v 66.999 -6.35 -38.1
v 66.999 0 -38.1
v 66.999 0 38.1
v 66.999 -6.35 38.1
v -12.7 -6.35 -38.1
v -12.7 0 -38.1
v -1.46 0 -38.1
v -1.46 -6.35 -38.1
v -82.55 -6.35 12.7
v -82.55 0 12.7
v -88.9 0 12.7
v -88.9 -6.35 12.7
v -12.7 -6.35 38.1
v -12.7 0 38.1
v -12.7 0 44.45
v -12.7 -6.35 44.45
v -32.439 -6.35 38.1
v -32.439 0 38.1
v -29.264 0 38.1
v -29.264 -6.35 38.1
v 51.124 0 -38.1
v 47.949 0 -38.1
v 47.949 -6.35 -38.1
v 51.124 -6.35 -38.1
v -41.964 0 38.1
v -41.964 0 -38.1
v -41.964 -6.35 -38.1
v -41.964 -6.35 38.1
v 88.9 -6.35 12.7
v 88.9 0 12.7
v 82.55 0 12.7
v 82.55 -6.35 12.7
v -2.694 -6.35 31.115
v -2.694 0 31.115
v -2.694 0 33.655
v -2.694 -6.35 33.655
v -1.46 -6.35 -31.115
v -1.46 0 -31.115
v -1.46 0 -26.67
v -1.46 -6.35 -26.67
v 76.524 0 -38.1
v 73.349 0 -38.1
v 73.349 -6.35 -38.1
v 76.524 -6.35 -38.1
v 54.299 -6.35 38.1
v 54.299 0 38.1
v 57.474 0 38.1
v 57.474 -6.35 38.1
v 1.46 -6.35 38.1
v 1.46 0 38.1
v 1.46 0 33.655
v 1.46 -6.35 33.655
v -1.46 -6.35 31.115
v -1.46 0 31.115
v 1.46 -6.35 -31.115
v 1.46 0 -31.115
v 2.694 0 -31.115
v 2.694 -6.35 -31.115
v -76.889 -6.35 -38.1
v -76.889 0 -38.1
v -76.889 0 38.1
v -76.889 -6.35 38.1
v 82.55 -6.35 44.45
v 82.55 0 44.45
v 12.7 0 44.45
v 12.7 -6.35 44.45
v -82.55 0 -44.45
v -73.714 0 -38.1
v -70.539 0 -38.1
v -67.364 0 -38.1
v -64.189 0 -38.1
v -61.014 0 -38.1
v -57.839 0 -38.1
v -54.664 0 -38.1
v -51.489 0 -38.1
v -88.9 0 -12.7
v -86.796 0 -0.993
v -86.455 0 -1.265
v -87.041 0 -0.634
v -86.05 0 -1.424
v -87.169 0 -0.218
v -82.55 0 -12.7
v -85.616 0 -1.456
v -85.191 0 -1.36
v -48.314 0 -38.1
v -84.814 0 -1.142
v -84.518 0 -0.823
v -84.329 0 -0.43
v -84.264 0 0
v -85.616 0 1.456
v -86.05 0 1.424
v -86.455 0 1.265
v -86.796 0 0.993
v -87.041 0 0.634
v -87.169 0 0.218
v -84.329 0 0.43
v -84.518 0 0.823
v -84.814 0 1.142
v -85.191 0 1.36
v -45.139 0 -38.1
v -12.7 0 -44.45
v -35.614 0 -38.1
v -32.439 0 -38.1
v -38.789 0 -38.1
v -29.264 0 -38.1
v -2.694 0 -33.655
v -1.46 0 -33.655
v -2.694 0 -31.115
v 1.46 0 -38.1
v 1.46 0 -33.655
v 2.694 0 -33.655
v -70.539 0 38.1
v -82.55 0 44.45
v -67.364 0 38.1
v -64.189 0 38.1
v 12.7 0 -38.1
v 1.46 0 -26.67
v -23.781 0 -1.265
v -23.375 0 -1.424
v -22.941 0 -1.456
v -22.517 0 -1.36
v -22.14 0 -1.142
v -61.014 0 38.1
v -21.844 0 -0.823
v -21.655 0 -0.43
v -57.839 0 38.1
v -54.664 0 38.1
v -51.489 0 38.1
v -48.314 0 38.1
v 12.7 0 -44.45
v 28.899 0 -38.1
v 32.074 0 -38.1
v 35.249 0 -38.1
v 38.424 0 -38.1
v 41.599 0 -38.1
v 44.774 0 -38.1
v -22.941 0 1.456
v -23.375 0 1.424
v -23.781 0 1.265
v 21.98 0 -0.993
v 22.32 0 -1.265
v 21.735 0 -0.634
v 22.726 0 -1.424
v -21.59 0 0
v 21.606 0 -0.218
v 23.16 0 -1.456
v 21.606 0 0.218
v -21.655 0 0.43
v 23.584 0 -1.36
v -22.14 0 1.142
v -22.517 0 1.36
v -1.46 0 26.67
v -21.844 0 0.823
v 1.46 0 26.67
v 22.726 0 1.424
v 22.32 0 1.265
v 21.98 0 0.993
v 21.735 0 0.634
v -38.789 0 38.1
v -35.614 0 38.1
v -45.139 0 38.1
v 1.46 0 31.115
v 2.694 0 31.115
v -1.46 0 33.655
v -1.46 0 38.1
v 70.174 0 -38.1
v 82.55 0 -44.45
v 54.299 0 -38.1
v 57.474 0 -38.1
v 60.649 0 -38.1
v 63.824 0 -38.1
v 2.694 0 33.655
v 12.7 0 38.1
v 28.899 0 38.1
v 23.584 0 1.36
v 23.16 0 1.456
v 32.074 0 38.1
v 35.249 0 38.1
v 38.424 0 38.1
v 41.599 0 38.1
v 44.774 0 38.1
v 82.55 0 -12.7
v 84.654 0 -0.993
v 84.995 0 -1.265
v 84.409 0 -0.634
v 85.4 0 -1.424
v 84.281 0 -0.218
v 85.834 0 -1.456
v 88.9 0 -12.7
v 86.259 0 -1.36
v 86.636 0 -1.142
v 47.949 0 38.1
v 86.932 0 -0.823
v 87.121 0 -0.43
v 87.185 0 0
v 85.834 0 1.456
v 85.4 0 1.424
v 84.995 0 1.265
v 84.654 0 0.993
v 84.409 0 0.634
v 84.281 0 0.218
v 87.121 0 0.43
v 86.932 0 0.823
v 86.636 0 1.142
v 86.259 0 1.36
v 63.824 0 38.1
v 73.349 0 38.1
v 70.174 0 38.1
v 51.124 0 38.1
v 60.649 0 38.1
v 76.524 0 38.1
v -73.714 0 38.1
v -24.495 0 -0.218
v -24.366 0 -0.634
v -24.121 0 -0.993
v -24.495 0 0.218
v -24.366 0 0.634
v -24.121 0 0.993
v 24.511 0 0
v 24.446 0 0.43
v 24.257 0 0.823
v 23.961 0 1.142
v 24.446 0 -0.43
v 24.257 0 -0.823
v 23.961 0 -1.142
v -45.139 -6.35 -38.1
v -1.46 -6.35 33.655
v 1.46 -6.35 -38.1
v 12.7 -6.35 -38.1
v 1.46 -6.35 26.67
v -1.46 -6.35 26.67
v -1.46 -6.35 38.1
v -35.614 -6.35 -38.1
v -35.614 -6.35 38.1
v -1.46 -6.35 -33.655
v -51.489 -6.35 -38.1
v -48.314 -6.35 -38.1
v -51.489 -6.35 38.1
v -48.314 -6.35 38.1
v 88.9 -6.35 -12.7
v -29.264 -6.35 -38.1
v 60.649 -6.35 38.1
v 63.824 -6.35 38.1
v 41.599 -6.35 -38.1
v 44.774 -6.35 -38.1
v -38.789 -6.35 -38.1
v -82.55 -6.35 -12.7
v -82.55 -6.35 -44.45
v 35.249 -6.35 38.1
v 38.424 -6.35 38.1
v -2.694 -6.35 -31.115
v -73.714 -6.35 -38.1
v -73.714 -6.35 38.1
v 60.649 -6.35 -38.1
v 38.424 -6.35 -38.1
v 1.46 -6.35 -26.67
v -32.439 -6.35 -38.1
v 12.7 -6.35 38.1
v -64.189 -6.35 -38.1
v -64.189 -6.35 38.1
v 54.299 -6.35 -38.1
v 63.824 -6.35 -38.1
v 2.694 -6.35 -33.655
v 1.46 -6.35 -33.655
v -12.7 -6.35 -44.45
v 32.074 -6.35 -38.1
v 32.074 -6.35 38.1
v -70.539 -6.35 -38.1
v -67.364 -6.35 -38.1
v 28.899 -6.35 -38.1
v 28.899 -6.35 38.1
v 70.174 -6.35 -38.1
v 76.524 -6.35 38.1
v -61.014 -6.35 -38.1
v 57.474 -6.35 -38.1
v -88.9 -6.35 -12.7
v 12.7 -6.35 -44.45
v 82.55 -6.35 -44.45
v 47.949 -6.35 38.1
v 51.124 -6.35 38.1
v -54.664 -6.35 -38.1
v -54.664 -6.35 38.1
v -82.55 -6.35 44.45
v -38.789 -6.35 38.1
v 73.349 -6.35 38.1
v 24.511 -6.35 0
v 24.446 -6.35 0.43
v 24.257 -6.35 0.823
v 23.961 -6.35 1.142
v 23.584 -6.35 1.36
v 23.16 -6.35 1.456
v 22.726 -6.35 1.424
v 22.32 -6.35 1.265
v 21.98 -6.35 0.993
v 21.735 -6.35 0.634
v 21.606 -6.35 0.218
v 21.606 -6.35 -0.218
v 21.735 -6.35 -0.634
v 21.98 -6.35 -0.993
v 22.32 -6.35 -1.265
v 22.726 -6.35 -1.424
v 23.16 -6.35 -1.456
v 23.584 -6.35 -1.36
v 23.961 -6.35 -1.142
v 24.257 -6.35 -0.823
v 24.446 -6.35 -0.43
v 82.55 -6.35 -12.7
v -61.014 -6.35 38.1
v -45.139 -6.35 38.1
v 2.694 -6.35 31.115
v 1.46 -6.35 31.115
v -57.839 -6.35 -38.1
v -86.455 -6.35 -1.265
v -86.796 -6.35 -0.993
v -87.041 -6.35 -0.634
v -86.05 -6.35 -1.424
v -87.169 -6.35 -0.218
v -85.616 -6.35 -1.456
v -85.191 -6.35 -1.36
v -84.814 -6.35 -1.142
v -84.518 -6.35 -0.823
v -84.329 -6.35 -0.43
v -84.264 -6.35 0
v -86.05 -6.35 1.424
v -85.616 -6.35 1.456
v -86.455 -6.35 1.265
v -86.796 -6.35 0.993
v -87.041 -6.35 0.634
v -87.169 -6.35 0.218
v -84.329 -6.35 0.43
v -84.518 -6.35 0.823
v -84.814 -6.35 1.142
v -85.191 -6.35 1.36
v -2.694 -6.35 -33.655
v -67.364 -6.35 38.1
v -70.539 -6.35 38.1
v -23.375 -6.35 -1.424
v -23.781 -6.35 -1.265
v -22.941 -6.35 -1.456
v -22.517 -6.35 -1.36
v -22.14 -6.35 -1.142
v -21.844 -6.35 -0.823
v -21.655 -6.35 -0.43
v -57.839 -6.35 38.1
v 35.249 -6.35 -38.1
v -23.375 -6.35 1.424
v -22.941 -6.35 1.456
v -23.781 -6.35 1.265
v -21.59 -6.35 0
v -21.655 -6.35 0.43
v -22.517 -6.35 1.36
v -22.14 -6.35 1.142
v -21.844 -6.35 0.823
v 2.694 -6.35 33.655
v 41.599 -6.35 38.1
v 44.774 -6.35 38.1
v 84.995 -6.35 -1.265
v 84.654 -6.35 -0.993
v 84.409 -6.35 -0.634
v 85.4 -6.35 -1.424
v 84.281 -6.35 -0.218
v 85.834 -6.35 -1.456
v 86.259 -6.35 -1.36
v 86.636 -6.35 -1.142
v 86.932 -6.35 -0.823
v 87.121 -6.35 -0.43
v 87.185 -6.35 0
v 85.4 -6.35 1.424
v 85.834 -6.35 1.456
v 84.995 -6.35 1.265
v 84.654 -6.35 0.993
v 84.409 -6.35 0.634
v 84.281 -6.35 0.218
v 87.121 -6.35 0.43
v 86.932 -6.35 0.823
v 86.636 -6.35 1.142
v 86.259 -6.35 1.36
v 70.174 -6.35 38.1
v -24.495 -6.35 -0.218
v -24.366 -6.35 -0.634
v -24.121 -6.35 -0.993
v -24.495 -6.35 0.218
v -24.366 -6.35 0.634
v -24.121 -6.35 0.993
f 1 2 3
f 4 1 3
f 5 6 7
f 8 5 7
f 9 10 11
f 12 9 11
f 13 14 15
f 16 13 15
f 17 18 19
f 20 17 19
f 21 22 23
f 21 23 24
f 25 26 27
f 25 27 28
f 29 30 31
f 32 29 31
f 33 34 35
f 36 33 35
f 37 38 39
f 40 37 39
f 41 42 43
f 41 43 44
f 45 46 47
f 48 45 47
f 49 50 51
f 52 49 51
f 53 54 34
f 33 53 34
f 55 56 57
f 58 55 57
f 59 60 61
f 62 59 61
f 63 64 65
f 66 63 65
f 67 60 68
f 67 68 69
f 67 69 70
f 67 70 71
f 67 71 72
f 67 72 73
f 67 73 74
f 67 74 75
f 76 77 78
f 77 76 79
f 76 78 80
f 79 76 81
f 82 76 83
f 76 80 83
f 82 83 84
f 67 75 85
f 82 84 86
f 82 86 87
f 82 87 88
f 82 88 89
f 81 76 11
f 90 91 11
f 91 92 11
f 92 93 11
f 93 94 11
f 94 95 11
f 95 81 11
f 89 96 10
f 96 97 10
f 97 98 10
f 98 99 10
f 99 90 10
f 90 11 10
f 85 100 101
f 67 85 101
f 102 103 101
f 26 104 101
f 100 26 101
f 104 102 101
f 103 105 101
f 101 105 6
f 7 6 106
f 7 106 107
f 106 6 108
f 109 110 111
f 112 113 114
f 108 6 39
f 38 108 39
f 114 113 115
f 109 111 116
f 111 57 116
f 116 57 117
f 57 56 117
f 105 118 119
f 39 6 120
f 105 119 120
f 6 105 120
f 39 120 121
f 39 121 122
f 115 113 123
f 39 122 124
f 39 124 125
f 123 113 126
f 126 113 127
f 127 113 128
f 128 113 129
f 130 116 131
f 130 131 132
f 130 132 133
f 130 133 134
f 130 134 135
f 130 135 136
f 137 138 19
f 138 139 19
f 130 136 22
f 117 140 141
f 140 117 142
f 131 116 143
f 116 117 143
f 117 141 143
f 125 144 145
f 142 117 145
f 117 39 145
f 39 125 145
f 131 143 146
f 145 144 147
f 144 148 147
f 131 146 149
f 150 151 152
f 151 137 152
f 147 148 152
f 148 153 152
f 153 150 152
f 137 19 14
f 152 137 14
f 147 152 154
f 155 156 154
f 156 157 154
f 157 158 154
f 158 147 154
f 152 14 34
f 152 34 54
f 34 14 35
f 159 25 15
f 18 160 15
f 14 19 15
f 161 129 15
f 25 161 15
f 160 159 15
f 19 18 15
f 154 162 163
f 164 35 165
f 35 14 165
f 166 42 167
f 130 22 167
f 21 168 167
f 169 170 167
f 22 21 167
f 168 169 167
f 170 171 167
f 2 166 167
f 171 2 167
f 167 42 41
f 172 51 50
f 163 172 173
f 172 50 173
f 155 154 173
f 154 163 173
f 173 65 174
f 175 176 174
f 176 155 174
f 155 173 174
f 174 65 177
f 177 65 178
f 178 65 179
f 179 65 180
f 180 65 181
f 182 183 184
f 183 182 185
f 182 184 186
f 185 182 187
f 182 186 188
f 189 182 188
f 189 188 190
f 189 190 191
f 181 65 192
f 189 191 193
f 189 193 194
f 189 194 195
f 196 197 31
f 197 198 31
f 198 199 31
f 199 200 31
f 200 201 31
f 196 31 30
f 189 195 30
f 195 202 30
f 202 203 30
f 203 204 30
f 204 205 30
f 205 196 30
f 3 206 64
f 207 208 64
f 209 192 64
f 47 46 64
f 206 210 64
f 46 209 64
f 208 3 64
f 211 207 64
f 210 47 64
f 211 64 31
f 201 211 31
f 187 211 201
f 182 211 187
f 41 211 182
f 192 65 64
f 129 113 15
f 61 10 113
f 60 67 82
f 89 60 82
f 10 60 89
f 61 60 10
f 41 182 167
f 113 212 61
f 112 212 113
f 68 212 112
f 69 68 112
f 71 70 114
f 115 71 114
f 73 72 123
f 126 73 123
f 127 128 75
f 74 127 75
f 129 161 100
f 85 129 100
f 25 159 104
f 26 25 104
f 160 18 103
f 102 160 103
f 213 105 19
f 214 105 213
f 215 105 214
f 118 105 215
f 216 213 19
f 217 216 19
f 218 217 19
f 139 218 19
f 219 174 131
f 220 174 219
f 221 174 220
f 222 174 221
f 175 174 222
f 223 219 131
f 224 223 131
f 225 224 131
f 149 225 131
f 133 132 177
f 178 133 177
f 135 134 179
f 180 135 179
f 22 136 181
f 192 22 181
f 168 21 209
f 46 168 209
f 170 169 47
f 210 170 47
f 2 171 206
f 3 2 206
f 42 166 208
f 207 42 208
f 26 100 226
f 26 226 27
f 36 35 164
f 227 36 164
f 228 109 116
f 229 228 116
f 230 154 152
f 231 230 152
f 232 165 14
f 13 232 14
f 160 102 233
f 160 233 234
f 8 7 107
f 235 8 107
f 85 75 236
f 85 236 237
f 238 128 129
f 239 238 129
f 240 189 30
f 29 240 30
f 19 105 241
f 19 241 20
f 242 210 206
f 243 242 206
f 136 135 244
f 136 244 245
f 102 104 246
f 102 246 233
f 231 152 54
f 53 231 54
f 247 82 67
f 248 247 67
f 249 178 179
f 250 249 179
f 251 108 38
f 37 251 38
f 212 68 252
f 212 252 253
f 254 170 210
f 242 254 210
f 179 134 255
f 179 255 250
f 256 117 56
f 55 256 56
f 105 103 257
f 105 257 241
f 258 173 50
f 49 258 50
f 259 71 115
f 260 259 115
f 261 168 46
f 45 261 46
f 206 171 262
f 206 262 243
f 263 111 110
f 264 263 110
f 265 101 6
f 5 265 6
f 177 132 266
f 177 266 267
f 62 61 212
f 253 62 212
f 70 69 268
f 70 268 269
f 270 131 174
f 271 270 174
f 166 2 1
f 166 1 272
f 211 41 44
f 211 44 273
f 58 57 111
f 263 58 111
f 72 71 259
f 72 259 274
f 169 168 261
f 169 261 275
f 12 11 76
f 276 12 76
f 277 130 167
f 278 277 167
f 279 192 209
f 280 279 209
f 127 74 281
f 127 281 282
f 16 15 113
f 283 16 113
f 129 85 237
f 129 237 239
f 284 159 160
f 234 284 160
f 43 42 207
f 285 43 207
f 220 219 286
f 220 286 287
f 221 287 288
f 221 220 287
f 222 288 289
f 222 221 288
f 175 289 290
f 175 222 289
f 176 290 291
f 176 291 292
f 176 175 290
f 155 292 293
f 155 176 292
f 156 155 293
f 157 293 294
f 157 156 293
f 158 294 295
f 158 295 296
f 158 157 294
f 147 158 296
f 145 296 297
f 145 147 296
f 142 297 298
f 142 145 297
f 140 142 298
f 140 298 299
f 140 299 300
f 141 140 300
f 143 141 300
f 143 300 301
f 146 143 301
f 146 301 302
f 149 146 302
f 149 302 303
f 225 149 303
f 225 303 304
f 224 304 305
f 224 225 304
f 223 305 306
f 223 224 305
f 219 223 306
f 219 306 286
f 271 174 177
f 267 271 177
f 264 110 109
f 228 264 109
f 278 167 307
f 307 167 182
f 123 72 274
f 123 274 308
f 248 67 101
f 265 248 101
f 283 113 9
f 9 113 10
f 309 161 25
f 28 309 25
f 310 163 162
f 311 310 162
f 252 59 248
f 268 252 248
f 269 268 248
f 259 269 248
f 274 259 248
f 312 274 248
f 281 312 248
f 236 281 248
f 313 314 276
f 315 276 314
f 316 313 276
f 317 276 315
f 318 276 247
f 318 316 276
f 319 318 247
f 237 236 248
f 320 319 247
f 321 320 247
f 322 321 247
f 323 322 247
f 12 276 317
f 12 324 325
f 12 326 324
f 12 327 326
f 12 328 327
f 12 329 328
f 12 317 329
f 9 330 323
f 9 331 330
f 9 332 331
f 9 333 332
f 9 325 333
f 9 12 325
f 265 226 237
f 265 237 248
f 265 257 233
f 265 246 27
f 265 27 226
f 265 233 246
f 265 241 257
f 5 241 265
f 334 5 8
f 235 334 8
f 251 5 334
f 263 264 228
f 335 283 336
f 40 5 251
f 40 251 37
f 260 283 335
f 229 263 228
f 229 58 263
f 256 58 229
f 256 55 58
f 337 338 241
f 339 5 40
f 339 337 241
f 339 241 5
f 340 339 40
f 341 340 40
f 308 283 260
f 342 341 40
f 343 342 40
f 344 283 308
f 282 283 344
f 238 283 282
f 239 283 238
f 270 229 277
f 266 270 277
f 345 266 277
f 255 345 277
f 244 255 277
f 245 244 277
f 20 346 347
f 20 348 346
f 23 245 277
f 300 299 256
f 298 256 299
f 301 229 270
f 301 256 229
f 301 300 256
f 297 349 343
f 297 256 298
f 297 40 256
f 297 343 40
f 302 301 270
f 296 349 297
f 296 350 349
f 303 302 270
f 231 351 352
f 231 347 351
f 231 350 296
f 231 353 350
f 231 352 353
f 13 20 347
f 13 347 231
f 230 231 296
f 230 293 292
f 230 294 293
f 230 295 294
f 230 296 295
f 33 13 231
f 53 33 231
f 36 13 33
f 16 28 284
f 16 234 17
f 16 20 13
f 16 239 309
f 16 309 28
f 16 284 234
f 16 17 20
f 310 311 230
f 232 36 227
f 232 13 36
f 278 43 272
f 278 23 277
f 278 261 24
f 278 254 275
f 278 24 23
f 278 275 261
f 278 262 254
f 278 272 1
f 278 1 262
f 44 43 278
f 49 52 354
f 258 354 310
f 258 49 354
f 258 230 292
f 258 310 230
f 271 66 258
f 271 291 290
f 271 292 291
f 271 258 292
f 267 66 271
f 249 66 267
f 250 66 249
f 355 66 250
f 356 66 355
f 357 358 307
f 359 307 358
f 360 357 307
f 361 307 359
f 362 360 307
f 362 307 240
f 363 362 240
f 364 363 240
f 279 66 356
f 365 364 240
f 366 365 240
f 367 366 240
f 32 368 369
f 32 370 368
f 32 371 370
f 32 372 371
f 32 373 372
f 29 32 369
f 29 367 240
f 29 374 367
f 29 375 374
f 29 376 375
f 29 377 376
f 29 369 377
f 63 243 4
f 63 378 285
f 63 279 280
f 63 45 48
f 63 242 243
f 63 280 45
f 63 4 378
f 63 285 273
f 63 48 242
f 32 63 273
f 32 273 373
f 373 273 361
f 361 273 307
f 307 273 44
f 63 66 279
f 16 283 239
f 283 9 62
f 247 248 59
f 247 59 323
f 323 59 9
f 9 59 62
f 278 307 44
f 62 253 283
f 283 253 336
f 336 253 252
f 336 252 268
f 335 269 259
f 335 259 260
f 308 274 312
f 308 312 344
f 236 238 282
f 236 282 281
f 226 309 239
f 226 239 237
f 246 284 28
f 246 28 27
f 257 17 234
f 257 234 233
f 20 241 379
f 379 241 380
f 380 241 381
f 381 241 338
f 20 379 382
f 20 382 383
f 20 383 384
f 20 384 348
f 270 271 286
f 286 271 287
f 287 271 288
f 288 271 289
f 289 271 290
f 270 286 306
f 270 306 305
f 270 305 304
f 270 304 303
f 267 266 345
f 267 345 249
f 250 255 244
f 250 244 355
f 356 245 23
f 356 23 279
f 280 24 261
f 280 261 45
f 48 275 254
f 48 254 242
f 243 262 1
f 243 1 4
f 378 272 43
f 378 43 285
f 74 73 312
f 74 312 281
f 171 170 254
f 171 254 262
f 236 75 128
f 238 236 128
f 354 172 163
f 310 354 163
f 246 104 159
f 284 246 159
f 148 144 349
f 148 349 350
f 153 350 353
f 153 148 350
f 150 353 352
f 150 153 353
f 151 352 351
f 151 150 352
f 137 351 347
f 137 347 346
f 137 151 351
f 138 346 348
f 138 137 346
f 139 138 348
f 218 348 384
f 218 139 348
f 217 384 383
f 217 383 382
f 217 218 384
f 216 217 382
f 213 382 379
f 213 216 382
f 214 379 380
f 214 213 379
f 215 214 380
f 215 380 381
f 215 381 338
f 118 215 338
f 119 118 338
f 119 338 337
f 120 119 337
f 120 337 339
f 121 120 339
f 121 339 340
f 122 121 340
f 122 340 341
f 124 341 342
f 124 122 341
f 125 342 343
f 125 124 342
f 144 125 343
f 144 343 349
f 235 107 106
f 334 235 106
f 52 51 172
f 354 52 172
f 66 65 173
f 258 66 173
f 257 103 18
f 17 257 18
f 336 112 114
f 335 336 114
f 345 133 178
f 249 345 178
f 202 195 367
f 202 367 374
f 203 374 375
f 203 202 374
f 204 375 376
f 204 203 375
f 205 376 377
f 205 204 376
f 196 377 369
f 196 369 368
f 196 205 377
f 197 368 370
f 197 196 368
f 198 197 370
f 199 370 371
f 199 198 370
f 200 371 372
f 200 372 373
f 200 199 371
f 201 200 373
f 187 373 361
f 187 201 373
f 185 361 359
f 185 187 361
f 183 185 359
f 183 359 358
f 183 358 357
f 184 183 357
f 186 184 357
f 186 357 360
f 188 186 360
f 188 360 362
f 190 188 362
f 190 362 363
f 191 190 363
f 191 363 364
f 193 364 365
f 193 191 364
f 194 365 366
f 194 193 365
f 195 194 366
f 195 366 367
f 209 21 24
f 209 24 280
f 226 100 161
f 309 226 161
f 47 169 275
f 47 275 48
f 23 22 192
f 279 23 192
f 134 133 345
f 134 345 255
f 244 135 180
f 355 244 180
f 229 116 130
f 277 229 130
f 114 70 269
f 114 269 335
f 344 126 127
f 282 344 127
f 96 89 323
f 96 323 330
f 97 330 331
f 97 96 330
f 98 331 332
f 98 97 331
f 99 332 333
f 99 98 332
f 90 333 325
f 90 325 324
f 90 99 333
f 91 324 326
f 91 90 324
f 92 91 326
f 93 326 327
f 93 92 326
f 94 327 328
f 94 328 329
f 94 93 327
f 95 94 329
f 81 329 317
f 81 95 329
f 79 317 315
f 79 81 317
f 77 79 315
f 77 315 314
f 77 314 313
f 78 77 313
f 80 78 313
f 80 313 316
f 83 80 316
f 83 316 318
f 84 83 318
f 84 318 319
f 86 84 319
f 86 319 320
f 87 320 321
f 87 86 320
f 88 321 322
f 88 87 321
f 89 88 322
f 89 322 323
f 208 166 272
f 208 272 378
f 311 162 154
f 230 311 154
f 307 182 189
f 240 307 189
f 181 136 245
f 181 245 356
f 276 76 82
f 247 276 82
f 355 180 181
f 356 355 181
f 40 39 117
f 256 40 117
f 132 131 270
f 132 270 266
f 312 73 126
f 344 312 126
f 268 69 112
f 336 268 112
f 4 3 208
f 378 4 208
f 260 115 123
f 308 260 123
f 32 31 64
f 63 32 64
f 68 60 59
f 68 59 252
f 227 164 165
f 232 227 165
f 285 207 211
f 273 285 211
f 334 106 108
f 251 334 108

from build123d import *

# Parameters (mm, degrees)
F0_W     = 3.175
F0_H     = 76.2
F0_R     = 1.4605
F1_DEPTH = 6.35


with BuildPart() as f1:
    # F0 (on Front) → F1 (new body)
    with BuildSketch(Plane.XZ):
        Polygon((82.55, 12.7), (82.55, 44.45), (12.7, 44.45), (12.7, 38.1), (1.4605, 38.1), (1.4605, 33.655), (2.69367, 33.655), (2.69367, 31.115), (1.4605, 31.115), (1.4605, 26.67), (-1.4605, 26.67), (-1.4605, 31.115), (-2.69367, 31.115), (-2.69367, 33.655), (-1.4605, 33.655), (-1.4605, 38.1), (-12.7, 38.1), (-12.7, 44.45), (-82.55, 44.45), (-82.55, 12.7), (-88.9, 12.7), (-88.9, -12.7), (-82.55, -12.7), (-82.55, -44.45), (-12.7, -44.45), (-12.7, -38.1), (-1.4605, -38.1), (-1.4605, -33.655), (-2.69367, -33.655), (-2.69367, -31.115), (-1.4605, -31.115), (-1.4605, -26.67), (1.4605, -26.67), (1.4605, -31.115), (2.69367, -31.115), (2.69367, -33.655), (1.4605, -33.655), (1.4605, -38.1), (12.7, -38.1), (12.7, -44.45), (82.55, -44.45), (82.55, -12.7), (88.9, -12.7), (88.9, 12.7), align=None)
        with Locations((-75.301861, 0)):
            Rectangle(F0_W, F0_H, mode=Mode.SUBTRACT)
        with Locations((-68.951861, 0)):
            Rectangle(F0_W, F0_H, mode=Mode.SUBTRACT)
        with Locations((-62.601861, 0)):
            Rectangle(F0_W, F0_H, mode=Mode.SUBTRACT)
        with Locations((-56.251861, 0)):
            Rectangle(F0_W, F0_H, mode=Mode.SUBTRACT)
        with Locations((-49.901861, 0)):
            Rectangle(F0_W, F0_H, mode=Mode.SUBTRACT)
        with Locations((-43.551861, 0)):
            Rectangle(F0_W, F0_H, mode=Mode.SUBTRACT)
        with Locations((-37.201861, 0)):
            Rectangle(F0_W, F0_H, mode=Mode.SUBTRACT)
        with Locations((-30.851861, 0)):
            Rectangle(F0_W, F0_H, mode=Mode.SUBTRACT)
        with Locations((-85.725, 0)):
            Circle(F0_R, mode=Mode.SUBTRACT)
        with Locations((-23.0505, 0)):
            Circle(F0_R, mode=Mode.SUBTRACT)
        with Locations((23.0505, 0)):
            Circle(F0_R, mode=Mode.SUBTRACT)
        with Locations((30.486395, 0)):
            Rectangle(F0_W, F0_H, mode=Mode.SUBTRACT)
        with Locations((36.836395, 0)):
            Rectangle(F0_W, F0_H, mode=Mode.SUBTRACT)
        with Locations((43.186395, 0)):
            Rectangle(F0_W, F0_H, mode=Mode.SUBTRACT)
        with Locations((49.536395, 0)):
            Rectangle(F0_W, F0_H, mode=Mode.SUBTRACT)
        with Locations((55.886395, 0)):
            Rectangle(F0_W, F0_H, mode=Mode.SUBTRACT)
        with Locations((62.236395, 0)):
            Rectangle(F0_W, F0_H, mode=Mode.SUBTRACT)
        with Locations((68.586395, 0)):
            Rectangle(F0_W, F0_H, mode=Mode.SUBTRACT)
        with Locations((74.936395, 0)):
            Rectangle(F0_W, F0_H, mode=Mode.SUBTRACT)
        with Locations((85.725, 0)):
            Circle(F0_R, mode=Mode.SUBTRACT)
    extrude(amount=F1_DEPTH)


solid = f1.part
